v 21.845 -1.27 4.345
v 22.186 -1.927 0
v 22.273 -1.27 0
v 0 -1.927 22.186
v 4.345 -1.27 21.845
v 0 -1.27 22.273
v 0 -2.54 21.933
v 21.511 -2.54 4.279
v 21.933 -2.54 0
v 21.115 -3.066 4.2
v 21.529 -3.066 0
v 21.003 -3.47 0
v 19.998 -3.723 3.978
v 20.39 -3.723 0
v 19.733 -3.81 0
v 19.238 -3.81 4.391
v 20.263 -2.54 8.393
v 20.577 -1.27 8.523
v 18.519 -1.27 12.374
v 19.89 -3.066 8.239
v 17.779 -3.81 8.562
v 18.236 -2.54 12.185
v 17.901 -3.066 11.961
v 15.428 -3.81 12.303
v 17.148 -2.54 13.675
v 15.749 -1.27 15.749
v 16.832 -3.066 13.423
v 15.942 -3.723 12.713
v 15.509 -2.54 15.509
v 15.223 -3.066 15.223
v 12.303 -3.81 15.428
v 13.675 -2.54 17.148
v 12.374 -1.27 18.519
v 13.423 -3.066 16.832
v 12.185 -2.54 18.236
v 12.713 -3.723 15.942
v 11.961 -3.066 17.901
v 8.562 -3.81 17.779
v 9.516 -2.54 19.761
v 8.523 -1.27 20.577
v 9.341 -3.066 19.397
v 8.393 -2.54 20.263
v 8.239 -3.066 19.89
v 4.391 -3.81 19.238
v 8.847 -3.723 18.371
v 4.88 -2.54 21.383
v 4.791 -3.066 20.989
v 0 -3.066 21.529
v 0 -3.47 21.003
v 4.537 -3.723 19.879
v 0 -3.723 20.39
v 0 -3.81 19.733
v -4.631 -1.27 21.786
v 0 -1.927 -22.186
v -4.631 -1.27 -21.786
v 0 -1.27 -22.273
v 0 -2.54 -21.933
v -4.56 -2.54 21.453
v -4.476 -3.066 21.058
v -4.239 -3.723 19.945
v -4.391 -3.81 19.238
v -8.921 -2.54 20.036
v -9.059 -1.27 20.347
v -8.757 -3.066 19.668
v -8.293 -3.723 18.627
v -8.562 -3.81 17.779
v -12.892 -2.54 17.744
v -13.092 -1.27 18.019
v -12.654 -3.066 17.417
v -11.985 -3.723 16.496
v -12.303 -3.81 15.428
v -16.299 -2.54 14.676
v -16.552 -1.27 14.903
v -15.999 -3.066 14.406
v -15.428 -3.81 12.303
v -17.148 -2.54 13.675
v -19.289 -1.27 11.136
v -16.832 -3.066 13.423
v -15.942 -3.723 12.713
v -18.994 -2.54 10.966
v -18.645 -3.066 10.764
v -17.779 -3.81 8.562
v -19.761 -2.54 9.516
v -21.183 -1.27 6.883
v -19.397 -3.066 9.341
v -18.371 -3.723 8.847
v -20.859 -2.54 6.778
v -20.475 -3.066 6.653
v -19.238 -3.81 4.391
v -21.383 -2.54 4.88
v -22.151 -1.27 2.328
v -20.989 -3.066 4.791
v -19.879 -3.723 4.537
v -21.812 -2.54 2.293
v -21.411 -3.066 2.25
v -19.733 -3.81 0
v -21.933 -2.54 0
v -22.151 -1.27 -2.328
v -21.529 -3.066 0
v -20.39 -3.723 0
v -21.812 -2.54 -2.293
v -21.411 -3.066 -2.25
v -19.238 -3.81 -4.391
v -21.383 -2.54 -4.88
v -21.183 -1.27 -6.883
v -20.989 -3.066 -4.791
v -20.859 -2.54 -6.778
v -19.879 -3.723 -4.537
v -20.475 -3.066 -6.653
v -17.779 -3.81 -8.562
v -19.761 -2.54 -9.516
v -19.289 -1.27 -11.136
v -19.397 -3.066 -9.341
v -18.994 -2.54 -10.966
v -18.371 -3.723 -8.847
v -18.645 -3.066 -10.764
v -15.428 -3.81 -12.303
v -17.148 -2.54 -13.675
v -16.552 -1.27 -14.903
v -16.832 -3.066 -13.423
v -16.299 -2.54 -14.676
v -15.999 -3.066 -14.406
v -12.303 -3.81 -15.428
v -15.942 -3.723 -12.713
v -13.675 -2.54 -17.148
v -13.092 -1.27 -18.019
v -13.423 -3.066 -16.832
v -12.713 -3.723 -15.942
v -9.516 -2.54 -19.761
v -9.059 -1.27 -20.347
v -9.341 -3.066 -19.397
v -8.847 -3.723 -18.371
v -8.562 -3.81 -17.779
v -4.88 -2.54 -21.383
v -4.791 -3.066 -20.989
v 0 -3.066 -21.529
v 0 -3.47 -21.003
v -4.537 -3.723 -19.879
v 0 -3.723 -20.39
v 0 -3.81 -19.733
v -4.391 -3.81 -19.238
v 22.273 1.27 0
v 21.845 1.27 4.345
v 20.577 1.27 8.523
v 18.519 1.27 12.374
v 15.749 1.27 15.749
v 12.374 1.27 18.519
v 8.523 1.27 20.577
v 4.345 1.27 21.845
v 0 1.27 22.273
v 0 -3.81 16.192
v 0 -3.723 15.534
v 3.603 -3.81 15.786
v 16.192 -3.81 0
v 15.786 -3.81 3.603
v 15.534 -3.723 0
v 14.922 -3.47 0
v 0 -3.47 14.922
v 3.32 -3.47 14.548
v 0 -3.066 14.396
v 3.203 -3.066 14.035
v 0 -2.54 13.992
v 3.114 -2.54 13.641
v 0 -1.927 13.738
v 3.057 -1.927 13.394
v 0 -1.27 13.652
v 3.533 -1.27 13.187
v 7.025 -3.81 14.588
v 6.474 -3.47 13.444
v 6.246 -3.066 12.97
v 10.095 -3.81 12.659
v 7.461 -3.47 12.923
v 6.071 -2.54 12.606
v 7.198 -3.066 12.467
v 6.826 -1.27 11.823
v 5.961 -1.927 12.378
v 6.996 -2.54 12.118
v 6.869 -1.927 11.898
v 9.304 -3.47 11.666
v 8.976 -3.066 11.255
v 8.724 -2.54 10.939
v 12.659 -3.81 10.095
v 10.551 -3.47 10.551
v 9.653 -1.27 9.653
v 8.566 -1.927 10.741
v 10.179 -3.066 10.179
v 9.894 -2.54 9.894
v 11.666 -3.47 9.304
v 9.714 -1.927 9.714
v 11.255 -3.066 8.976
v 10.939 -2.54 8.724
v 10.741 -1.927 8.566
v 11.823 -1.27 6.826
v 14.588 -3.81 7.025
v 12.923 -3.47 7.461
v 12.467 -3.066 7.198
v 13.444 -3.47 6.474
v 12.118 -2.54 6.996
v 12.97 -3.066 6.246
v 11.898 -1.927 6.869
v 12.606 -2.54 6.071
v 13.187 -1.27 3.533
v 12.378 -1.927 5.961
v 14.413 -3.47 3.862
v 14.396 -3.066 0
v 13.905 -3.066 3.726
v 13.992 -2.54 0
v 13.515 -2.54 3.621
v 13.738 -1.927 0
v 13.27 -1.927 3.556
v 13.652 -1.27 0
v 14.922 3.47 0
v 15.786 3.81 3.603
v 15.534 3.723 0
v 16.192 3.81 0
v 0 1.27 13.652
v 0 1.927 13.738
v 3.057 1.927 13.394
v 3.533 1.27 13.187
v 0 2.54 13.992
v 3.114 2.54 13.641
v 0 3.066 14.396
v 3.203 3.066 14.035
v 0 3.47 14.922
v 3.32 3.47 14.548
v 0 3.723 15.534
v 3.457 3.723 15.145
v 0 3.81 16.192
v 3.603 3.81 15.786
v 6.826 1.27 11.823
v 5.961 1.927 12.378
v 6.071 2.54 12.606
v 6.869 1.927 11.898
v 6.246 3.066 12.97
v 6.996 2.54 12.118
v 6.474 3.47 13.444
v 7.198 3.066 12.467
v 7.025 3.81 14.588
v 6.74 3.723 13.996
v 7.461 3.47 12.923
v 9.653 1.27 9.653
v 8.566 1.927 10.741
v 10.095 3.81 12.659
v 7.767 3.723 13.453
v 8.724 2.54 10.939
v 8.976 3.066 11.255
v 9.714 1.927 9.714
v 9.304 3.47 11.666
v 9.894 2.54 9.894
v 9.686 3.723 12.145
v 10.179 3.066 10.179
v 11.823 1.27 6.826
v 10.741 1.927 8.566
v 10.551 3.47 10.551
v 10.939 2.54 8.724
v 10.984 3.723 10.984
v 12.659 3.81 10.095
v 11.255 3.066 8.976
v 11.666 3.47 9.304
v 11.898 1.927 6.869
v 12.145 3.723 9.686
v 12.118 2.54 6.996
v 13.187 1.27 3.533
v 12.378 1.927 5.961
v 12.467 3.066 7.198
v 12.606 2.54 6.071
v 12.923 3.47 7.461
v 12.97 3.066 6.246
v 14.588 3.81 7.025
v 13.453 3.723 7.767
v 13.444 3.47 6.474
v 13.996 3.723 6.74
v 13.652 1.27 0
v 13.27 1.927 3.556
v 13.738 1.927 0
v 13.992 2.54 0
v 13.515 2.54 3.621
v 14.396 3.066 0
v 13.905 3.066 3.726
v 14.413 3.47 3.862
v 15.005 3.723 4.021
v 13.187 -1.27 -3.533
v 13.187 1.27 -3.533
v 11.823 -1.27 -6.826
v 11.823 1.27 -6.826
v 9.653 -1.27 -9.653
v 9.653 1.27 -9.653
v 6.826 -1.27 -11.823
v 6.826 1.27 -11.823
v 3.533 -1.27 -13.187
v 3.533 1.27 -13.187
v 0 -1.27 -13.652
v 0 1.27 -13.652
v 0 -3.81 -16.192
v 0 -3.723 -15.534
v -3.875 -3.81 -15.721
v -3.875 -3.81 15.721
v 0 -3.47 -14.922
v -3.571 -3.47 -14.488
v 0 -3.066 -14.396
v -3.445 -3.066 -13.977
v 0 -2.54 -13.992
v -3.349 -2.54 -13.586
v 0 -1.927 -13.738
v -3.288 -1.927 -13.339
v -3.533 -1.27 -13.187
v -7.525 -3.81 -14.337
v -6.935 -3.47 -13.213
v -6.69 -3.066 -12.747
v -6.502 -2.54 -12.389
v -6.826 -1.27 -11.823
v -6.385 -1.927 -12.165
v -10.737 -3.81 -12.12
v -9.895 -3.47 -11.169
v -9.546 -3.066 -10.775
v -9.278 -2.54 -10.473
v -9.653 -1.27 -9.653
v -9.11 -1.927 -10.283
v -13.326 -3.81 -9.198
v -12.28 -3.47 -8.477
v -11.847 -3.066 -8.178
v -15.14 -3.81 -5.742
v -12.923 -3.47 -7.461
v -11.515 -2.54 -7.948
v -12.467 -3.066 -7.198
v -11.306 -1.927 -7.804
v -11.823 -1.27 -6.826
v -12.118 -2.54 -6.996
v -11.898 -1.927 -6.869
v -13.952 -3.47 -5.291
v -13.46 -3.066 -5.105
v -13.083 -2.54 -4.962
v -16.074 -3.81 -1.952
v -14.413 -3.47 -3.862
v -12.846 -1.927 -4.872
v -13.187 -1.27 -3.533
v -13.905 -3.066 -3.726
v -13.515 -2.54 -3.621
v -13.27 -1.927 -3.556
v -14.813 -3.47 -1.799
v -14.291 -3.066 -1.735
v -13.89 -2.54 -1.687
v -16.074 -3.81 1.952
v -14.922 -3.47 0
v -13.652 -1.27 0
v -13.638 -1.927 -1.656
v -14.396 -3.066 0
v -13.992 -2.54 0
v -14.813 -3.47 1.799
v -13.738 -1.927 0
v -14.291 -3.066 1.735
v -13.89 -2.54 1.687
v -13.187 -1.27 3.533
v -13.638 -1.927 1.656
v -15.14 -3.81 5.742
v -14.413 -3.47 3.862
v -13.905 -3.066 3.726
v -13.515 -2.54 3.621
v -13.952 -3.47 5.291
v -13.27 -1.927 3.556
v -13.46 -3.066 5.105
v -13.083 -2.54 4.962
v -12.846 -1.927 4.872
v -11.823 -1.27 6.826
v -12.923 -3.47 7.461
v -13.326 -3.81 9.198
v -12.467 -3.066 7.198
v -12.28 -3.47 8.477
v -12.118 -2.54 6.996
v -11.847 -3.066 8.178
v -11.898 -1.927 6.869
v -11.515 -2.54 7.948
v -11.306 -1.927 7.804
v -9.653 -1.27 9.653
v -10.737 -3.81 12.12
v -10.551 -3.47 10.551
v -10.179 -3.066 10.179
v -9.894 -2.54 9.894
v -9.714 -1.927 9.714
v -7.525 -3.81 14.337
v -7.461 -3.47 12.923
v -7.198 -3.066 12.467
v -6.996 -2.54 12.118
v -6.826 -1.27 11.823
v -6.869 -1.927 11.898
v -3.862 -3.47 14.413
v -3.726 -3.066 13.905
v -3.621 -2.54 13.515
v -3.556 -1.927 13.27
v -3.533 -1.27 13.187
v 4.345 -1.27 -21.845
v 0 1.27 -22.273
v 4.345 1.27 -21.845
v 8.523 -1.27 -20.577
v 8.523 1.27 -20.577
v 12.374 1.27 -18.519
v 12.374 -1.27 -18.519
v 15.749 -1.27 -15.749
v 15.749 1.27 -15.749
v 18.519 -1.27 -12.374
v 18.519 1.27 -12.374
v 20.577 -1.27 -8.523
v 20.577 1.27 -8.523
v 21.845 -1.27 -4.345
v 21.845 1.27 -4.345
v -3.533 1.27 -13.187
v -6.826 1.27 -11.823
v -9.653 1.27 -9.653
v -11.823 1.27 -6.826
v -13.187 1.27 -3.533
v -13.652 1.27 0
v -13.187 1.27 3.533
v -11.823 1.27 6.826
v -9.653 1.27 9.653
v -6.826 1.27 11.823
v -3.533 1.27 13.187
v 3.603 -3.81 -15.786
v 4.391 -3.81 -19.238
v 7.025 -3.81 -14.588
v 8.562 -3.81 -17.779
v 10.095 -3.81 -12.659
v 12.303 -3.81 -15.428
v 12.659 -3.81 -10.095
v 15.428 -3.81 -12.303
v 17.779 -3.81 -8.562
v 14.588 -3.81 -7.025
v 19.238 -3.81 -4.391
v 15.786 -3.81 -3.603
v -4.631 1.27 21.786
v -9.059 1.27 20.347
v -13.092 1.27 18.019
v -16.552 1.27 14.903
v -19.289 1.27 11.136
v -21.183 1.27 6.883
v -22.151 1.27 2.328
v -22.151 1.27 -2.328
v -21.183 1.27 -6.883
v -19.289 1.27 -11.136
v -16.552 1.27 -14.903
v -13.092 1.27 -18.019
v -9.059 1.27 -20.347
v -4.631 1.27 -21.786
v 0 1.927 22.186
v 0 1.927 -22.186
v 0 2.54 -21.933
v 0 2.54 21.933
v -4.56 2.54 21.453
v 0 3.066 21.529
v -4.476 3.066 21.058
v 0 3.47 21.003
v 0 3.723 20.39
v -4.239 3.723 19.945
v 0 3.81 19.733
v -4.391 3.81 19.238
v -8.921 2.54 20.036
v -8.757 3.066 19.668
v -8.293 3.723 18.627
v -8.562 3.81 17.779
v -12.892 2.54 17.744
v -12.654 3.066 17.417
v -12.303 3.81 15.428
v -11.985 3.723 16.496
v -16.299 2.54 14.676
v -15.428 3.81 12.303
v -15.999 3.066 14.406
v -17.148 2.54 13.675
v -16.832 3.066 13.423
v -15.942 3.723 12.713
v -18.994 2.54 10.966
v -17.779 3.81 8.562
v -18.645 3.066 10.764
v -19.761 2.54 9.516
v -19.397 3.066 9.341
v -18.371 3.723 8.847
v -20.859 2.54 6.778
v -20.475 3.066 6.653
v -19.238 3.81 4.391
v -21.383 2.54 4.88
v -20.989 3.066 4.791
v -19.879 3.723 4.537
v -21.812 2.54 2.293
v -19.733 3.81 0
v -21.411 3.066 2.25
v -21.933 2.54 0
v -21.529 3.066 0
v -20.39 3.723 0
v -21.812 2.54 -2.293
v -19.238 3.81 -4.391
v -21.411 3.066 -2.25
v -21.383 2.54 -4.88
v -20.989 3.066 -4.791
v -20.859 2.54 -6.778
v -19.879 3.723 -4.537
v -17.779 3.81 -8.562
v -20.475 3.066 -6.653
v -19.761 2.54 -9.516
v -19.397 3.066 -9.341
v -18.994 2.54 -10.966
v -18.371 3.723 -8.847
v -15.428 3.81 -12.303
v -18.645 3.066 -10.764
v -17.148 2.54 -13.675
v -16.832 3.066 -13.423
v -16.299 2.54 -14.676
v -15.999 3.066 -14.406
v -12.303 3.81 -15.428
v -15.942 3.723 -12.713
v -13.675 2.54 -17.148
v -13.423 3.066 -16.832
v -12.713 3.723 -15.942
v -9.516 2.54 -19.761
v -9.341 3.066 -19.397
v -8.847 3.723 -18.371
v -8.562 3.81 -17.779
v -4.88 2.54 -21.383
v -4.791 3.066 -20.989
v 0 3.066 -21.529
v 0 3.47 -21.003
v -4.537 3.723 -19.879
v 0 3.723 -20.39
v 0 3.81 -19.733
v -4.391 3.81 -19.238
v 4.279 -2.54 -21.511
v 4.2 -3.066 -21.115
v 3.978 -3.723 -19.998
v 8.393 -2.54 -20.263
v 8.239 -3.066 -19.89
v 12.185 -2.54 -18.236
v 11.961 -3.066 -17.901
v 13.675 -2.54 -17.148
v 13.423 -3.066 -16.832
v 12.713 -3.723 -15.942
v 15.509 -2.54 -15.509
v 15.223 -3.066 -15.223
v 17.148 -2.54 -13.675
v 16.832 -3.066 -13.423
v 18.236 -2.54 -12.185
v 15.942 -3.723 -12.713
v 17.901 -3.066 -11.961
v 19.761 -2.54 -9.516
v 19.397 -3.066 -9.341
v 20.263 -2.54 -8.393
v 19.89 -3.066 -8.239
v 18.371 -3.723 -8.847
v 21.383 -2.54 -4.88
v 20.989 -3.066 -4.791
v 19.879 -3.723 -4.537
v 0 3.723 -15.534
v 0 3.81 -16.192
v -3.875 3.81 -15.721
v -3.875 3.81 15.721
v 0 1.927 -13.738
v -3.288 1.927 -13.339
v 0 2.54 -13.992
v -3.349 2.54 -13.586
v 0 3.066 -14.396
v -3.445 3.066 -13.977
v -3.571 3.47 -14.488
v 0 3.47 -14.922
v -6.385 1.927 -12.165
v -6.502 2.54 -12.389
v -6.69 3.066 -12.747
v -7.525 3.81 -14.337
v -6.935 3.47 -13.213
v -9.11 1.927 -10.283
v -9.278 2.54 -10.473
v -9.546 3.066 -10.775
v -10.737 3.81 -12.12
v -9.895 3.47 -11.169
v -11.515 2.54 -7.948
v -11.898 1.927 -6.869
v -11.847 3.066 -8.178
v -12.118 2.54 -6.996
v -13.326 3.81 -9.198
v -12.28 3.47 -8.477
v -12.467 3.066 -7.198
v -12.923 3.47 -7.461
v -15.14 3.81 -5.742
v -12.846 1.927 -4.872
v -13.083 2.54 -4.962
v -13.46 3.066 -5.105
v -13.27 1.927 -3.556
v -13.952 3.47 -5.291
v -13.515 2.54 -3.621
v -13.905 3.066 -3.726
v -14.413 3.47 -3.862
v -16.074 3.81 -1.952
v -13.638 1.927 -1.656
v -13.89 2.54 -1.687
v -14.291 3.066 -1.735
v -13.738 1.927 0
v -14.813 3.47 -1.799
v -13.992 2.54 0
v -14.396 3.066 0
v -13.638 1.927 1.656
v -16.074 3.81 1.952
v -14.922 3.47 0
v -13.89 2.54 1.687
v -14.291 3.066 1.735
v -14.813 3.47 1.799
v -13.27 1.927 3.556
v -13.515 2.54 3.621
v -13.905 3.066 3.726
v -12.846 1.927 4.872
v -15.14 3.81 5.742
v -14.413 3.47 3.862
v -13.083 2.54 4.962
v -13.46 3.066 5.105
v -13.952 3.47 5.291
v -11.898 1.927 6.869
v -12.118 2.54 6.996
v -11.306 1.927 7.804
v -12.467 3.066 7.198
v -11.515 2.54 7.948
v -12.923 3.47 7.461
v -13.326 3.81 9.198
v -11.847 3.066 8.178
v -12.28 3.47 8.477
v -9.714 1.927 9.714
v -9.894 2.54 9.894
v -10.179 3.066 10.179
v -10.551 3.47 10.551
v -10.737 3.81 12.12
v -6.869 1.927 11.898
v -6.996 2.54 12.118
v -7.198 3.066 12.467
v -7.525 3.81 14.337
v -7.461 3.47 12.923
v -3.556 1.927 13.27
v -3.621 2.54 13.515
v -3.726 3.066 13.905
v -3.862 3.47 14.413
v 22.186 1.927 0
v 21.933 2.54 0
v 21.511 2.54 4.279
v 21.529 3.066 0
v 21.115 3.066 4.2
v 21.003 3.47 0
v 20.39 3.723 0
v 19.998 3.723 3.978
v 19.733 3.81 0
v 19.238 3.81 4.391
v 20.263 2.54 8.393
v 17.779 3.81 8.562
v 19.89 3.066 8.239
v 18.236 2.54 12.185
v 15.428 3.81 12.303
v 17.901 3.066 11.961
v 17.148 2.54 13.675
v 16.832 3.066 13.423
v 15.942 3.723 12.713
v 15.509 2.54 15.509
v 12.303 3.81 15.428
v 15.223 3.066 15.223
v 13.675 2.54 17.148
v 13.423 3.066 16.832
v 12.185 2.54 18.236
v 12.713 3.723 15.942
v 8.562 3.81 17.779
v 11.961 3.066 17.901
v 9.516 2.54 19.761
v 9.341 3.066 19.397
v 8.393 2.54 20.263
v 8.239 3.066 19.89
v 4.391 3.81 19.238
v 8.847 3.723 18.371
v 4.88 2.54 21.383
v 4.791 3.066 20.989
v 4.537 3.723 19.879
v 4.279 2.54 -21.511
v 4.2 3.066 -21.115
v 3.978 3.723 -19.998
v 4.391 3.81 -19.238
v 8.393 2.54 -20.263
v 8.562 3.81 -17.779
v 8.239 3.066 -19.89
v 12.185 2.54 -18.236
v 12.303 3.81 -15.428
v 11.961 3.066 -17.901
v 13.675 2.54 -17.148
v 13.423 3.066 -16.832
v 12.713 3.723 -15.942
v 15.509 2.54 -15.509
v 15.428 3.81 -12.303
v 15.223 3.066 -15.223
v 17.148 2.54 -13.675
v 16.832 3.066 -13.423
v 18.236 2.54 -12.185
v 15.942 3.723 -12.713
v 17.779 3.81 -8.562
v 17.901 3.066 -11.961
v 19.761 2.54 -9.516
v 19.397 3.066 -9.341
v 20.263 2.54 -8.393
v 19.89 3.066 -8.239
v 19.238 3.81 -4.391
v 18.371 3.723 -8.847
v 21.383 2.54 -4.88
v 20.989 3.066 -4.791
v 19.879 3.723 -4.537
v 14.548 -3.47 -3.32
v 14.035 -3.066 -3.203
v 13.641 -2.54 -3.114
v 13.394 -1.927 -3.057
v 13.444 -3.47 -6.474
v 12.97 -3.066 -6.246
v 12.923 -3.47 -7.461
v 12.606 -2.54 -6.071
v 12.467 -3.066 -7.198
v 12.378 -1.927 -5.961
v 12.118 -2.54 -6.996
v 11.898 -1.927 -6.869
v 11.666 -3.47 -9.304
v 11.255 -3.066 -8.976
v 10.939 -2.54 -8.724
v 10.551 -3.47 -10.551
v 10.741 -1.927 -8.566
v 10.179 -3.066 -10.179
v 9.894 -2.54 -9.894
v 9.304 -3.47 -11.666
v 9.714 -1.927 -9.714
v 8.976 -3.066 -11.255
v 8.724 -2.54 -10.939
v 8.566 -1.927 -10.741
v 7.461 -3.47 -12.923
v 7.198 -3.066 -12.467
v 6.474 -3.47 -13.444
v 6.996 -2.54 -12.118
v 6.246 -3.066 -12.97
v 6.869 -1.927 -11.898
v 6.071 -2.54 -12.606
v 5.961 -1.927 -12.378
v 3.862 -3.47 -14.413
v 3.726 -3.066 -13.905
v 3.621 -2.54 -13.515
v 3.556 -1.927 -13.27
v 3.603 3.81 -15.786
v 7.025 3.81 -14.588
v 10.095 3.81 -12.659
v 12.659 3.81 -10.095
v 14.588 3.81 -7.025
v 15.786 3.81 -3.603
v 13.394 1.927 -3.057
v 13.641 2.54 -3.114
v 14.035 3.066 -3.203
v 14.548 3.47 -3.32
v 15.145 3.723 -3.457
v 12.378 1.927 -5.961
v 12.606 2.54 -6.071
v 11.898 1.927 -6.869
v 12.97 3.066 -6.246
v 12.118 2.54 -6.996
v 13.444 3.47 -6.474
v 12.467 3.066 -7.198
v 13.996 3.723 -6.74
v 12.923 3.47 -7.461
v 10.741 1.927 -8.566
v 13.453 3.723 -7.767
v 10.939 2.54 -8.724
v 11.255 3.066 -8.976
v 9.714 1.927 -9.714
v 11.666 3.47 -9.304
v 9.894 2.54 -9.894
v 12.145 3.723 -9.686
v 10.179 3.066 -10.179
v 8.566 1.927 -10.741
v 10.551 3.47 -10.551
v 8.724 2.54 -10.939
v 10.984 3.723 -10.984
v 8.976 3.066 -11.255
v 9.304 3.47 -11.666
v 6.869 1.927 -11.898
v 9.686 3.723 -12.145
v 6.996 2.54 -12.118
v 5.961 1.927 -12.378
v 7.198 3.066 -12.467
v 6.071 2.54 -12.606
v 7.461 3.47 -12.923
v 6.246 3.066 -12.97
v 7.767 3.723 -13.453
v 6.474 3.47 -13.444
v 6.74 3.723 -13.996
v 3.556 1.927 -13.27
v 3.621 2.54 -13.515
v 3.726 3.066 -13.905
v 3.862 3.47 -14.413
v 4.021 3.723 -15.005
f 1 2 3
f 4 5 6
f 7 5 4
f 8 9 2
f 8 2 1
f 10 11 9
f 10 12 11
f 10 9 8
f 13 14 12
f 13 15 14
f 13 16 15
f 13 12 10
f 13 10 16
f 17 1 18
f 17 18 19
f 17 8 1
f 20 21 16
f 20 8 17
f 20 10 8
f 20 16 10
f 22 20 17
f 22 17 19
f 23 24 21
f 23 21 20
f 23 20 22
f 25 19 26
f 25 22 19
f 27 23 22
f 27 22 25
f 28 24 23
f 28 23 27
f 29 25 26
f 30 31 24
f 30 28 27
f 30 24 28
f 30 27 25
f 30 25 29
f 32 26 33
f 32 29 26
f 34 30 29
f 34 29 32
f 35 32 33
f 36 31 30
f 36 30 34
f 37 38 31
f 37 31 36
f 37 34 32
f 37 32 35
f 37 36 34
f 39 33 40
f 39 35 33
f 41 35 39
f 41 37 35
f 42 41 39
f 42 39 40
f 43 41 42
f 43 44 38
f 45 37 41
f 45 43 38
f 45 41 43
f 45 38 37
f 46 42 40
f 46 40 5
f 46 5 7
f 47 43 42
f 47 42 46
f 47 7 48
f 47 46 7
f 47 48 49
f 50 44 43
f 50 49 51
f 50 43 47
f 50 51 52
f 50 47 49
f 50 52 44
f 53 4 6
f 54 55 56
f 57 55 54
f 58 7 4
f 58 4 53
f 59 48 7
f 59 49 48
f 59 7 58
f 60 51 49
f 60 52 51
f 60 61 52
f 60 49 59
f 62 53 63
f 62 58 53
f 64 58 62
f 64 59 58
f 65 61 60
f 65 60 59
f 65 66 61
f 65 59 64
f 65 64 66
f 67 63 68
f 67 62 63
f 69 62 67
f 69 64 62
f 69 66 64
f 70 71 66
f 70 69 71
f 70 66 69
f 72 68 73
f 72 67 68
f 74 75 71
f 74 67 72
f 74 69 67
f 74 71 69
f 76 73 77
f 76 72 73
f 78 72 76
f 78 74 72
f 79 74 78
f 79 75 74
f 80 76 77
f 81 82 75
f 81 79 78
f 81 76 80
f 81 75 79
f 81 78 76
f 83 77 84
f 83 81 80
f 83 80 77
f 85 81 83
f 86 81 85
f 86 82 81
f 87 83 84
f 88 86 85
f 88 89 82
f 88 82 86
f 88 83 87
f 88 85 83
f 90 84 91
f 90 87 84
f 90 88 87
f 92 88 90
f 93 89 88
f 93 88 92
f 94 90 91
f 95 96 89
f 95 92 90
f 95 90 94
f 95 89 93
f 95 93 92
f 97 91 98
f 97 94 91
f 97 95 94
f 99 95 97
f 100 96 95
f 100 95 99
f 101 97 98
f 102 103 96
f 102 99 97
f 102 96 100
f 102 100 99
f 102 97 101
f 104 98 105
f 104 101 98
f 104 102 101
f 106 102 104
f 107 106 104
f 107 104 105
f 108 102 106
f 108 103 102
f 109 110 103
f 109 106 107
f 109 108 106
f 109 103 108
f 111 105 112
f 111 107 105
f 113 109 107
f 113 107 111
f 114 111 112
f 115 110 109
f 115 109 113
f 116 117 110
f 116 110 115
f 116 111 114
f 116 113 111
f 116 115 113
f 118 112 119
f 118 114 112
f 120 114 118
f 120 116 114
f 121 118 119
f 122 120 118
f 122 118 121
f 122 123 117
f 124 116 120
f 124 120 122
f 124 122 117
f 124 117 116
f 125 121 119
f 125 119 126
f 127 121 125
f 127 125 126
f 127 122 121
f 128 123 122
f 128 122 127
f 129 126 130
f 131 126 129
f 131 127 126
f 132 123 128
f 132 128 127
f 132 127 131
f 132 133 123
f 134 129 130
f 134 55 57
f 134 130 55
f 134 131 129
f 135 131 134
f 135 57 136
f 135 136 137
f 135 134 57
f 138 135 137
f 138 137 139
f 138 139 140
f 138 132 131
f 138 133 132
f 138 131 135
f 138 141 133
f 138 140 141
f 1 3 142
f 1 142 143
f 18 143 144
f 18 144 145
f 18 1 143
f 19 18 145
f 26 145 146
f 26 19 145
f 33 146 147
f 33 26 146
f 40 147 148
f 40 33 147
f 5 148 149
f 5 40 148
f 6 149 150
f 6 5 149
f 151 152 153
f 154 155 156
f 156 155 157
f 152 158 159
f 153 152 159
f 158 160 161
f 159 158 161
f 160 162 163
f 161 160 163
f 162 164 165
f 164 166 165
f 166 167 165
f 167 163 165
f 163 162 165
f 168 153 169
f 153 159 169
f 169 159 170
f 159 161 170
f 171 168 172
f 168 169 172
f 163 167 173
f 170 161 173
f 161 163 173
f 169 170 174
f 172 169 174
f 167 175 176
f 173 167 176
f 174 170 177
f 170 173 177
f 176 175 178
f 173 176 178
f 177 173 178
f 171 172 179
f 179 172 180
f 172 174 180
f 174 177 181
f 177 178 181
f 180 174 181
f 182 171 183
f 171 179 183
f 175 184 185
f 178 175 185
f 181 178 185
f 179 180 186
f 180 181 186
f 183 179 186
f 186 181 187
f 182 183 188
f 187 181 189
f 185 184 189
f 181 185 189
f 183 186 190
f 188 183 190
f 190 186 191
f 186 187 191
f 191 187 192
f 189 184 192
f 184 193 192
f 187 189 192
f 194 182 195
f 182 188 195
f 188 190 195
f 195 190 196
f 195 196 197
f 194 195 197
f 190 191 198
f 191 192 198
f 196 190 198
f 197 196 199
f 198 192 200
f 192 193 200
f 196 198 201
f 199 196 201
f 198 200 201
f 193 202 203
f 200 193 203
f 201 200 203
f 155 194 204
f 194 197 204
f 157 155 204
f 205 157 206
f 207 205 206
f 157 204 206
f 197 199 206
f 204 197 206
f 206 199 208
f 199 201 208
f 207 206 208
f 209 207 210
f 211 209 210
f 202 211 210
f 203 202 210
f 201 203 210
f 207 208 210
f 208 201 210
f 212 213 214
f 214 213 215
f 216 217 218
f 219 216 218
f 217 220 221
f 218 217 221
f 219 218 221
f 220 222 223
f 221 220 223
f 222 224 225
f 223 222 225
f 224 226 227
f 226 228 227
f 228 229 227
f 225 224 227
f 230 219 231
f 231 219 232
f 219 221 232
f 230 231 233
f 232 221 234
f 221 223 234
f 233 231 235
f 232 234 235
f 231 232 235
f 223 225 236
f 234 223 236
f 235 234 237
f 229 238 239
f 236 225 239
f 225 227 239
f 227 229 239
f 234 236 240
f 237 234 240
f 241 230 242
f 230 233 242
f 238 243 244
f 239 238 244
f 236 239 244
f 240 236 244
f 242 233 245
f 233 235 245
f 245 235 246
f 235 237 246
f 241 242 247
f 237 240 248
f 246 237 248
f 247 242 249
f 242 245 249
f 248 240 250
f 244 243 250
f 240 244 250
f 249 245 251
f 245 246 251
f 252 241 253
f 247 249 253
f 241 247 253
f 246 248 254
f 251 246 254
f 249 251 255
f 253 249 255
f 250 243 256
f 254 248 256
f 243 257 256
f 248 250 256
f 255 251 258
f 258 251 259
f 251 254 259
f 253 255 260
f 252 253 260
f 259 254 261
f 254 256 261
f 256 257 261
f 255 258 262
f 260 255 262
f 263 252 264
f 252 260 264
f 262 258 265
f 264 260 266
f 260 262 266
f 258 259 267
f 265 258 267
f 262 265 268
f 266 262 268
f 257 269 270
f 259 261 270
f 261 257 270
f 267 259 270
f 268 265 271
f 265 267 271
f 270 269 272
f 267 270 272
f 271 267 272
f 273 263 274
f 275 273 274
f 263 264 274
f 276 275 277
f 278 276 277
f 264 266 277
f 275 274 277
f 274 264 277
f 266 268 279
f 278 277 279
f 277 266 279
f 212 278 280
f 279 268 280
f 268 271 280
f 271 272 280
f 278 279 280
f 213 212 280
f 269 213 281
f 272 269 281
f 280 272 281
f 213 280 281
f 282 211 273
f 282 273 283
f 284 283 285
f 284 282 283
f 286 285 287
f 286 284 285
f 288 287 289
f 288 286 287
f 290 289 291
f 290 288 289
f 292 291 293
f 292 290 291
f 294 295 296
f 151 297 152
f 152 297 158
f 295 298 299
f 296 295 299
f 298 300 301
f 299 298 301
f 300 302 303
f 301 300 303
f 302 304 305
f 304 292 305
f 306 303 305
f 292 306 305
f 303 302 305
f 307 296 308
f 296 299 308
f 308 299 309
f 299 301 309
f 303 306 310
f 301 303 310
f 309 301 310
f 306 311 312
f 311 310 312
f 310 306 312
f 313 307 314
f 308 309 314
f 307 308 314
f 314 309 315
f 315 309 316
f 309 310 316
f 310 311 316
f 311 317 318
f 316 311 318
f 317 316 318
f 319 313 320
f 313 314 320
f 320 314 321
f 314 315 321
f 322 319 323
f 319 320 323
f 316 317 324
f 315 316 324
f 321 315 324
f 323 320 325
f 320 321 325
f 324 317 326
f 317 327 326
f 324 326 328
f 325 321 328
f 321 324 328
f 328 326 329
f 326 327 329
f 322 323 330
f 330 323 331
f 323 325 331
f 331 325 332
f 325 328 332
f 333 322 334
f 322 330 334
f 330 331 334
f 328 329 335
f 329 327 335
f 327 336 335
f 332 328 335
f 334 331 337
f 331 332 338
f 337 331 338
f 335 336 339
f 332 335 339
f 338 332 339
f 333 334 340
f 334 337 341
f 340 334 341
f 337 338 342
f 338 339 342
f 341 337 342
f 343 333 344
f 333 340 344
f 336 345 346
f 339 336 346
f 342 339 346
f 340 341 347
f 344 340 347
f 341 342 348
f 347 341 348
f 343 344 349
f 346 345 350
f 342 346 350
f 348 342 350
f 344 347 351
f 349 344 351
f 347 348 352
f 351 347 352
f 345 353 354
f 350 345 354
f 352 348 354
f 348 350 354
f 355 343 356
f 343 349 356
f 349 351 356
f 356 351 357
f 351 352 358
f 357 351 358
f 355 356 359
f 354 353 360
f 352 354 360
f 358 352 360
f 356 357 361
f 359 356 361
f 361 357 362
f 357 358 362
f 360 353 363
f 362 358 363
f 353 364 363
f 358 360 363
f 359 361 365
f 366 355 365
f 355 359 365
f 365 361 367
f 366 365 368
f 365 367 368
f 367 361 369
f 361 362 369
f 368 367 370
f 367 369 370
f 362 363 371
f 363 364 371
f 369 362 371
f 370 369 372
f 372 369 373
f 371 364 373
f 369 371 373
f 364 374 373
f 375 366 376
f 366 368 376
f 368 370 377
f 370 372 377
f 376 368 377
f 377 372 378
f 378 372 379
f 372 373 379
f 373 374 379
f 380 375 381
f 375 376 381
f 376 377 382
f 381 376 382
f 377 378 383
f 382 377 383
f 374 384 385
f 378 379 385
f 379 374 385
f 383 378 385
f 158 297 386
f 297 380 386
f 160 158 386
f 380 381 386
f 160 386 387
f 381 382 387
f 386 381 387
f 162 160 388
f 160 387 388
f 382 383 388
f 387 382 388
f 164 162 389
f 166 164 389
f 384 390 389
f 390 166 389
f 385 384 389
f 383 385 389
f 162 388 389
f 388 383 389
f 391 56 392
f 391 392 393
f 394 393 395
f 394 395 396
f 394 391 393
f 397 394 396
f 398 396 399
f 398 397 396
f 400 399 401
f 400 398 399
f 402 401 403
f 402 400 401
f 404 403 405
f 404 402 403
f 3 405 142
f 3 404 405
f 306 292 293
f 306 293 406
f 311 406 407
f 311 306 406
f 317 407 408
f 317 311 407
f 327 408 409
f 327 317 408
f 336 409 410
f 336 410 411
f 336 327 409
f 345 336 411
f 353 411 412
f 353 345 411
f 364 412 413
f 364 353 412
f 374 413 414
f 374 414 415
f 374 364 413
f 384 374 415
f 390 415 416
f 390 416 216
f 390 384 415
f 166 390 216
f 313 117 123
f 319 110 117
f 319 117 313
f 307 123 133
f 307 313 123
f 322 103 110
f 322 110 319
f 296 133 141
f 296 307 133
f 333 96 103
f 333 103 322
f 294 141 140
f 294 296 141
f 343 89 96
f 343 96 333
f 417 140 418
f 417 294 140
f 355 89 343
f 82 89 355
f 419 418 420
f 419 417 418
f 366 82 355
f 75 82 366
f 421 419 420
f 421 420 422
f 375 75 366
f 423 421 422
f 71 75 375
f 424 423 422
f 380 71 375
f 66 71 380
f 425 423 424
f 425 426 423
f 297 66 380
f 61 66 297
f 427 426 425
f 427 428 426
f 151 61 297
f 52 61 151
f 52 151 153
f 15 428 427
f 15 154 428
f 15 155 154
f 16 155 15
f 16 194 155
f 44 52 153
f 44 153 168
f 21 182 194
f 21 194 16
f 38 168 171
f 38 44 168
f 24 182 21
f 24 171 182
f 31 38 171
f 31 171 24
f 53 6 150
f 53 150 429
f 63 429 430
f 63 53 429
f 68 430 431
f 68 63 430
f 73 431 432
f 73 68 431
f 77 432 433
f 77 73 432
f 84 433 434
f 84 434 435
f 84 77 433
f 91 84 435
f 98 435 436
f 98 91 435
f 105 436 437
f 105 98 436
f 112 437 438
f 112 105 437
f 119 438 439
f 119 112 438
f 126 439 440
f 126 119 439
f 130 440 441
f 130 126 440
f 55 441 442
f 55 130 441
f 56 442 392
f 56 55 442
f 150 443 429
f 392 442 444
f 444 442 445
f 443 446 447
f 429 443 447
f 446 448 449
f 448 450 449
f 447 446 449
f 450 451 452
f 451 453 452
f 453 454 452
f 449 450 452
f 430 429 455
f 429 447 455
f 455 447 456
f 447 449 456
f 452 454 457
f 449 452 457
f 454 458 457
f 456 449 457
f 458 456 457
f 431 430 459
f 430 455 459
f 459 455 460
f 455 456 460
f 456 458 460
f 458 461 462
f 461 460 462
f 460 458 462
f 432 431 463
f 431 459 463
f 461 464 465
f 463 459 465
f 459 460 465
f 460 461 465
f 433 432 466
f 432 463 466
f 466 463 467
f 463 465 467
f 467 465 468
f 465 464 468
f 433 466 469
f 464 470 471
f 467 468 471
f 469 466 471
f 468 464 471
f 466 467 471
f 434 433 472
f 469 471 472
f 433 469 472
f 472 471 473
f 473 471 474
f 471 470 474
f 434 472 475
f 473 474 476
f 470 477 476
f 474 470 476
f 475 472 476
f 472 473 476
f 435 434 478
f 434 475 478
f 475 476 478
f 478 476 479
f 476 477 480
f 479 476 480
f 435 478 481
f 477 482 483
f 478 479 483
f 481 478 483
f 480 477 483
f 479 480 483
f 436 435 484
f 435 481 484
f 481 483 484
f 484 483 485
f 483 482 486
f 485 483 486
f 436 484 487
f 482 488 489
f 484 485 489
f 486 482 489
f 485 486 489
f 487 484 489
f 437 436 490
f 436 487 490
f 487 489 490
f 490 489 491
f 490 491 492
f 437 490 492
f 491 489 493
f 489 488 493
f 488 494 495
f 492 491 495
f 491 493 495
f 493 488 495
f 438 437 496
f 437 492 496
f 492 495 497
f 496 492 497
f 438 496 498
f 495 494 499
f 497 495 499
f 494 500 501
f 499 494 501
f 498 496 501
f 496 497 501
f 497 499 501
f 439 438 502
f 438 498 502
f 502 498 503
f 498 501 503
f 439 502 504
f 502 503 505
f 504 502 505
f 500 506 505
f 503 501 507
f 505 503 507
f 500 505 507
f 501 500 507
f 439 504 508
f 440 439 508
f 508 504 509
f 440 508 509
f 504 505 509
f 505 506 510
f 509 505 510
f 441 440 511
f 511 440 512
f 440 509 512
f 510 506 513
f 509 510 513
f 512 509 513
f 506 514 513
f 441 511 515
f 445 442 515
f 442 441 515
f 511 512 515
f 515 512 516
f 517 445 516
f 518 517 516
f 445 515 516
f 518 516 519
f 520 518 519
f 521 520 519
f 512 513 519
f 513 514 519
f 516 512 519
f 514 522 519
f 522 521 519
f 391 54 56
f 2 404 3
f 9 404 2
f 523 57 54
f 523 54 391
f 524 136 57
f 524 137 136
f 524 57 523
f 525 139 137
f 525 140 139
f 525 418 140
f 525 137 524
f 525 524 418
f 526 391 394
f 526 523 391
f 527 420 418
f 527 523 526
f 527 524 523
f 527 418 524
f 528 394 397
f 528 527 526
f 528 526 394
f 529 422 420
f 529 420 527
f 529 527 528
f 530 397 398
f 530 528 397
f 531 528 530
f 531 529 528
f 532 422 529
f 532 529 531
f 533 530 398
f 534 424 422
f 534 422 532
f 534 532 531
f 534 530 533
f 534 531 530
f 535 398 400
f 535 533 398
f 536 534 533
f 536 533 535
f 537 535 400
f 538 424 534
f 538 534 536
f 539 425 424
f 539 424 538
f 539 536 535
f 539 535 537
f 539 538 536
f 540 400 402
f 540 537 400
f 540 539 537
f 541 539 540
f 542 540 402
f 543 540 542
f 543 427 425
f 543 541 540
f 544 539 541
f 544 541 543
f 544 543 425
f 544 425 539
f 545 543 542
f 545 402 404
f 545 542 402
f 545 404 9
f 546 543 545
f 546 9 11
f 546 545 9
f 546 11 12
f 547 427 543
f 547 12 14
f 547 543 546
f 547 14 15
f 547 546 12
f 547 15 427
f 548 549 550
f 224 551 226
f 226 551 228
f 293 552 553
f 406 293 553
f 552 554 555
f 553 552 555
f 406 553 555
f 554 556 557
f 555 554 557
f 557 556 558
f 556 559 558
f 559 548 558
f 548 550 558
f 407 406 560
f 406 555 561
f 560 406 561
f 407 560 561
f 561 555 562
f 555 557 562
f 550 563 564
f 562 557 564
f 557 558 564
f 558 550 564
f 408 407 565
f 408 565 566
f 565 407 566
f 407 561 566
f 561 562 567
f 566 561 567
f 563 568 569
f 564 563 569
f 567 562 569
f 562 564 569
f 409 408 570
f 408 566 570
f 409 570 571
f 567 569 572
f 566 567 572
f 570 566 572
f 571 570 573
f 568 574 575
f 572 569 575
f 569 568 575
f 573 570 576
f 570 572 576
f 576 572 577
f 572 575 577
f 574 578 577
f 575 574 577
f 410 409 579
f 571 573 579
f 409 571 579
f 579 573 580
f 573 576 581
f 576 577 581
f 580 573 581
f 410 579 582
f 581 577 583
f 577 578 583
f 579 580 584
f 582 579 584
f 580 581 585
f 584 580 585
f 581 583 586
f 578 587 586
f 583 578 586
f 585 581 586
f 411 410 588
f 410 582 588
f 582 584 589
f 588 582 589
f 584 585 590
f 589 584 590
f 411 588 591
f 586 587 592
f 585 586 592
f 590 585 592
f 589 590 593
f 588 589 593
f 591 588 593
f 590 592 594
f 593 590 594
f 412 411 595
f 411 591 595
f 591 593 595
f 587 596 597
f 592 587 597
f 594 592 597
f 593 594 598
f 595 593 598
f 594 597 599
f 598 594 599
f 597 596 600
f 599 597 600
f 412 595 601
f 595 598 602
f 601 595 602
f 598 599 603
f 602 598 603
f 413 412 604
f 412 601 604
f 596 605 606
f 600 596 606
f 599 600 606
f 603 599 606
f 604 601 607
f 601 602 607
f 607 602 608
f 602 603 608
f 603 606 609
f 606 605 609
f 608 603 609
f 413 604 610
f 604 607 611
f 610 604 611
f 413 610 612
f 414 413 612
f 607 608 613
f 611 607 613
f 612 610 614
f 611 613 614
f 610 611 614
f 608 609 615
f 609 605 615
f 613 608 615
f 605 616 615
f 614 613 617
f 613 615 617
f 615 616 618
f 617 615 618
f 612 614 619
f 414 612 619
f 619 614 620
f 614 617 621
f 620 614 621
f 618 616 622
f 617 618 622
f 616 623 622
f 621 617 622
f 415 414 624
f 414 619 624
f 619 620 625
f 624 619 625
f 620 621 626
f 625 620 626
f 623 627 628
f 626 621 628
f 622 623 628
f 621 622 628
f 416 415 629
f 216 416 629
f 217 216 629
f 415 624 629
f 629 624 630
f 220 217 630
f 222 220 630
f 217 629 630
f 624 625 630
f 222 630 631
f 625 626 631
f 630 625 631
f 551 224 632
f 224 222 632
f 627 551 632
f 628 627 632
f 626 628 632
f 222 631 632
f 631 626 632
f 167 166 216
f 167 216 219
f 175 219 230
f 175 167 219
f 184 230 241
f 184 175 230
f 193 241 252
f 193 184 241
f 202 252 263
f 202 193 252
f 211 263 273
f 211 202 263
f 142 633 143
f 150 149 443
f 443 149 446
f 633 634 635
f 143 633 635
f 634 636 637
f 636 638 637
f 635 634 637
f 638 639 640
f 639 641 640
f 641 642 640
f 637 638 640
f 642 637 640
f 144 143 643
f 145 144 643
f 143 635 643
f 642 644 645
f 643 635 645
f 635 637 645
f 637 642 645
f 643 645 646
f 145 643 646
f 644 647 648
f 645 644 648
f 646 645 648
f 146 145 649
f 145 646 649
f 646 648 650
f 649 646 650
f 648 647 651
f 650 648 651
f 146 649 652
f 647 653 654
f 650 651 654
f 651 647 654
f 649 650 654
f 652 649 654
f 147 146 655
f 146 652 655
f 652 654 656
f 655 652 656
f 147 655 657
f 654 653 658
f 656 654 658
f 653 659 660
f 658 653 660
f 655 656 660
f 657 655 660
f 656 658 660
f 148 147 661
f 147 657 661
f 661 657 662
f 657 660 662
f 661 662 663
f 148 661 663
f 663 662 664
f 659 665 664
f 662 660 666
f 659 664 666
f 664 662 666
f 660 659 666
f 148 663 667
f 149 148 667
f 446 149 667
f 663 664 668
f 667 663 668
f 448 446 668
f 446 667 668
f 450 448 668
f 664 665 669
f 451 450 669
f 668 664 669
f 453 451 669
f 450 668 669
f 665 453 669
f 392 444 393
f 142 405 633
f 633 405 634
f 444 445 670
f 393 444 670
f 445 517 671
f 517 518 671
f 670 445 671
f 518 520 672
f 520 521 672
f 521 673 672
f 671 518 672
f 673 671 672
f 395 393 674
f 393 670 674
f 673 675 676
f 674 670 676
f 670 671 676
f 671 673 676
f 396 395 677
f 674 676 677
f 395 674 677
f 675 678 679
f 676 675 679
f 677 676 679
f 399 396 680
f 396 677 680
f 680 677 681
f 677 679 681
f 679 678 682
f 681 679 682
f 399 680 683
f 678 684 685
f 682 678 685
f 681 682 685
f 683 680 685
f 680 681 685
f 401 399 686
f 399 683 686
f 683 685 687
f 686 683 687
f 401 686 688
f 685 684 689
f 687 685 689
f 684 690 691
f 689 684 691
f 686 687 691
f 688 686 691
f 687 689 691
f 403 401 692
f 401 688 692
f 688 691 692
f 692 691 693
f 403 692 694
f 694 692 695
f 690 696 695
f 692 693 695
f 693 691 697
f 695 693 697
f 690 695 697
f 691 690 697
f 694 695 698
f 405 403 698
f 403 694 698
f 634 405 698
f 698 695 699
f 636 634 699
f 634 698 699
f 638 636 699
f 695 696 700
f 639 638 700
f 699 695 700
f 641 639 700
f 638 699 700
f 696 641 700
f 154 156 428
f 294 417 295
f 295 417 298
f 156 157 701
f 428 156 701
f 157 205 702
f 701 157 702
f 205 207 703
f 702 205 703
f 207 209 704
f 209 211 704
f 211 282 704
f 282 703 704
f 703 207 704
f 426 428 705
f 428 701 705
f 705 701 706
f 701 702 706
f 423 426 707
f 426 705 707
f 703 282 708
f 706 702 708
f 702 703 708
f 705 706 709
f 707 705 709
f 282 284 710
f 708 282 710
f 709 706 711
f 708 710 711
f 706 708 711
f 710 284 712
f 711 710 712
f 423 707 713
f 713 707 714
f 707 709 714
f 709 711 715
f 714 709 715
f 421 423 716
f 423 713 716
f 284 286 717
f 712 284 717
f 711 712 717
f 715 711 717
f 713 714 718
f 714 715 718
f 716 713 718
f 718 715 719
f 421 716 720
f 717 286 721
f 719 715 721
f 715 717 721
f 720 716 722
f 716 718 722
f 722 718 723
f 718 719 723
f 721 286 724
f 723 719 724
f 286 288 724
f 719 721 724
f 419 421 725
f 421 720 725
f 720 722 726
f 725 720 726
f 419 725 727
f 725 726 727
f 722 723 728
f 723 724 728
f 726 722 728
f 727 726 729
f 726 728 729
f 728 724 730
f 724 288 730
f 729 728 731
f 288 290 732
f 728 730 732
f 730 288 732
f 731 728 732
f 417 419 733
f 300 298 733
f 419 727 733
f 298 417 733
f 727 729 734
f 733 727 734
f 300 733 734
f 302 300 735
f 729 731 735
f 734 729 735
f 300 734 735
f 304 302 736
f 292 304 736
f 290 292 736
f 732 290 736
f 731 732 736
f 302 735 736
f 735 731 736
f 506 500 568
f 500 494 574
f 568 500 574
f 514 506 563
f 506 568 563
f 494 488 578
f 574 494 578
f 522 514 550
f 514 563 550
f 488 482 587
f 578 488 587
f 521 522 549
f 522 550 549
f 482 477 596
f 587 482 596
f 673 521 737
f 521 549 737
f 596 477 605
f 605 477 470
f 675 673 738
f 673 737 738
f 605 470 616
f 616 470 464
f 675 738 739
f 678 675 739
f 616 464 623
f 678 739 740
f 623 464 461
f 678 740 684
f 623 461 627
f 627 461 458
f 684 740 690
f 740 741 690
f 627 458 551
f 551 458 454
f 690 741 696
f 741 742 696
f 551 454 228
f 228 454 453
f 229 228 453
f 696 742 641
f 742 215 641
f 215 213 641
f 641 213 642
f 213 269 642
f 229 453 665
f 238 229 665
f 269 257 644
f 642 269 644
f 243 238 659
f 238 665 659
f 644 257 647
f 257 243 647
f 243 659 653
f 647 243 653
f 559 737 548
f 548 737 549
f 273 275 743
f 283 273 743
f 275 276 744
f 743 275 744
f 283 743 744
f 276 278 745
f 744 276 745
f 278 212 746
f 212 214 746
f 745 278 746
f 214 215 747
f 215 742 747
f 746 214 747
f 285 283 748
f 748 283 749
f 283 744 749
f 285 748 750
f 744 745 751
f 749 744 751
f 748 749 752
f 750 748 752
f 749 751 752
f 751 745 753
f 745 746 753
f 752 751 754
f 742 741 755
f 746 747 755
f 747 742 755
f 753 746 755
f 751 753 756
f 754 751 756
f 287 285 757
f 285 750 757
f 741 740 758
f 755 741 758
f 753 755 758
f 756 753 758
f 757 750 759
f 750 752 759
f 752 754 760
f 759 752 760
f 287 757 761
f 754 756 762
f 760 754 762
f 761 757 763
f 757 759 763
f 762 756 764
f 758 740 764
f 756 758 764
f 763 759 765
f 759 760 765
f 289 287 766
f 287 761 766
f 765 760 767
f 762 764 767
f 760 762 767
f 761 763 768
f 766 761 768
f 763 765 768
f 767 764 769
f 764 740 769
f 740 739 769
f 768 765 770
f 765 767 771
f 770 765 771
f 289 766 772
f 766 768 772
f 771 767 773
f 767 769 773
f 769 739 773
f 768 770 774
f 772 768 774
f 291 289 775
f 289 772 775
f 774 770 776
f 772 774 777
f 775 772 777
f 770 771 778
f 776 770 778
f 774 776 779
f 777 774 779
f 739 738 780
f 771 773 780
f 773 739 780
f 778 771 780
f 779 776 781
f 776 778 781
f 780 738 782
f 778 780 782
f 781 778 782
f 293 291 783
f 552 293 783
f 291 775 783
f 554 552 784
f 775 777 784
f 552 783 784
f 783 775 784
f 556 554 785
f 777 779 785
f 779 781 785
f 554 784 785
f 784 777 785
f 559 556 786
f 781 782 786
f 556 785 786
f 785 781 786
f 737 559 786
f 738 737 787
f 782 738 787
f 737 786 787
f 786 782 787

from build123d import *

# Parameters (mm, degrees)
F1_DEPTH = 3.81
F2_R     = 2.54


with BuildPart() as f1:
    # F0 (on Front) → F1 (new body, symmetric)
    with BuildSketch(Plane.XZ):
        with BuildLine():
            ThreePointArc((0, -22.272892), (15.749313, -15.749313), (22.272892, 0))
            ThreePointArc((22.272892, 0), (15.749313, 15.749313), (0, 22.272892))
            Line((0, 22.272892), (0, 13.651826))
            ThreePointArc((0, 13.651826), (9.653299, 9.653299), (13.651826, 0))
            ThreePointArc((13.651826, 0), (9.653299, -9.653299), (0, -13.651826))
            Line((0, -13.651826), (0, -22.272892))
        make_face()
        with BuildLine():
            Line((0, 13.651826), (0, 22.272892))
            ThreePointArc((0, 22.272892), (-22.272892, 0), (0, -22.272892))
            Line((0, -22.272892), (0, -13.651826))
            ThreePointArc((0, -13.651826), (-13.651826, 0), (0, 13.651826))
        make_face()
    extrude(amount=F1_DEPTH, both=True)

    # F2
    f2_edges = [f1.edges().sort_by_distance(p)[0] for p in [
        (-13.651826, -3.81, 0),
        (-22.272892, -3.81, 0),
        (-22.272892, 3.81, 0),
        (-13.651826, 3.81, 0),
    ]]
    fillet(f2_edges, radius=F2_R)


solid = f1.part
